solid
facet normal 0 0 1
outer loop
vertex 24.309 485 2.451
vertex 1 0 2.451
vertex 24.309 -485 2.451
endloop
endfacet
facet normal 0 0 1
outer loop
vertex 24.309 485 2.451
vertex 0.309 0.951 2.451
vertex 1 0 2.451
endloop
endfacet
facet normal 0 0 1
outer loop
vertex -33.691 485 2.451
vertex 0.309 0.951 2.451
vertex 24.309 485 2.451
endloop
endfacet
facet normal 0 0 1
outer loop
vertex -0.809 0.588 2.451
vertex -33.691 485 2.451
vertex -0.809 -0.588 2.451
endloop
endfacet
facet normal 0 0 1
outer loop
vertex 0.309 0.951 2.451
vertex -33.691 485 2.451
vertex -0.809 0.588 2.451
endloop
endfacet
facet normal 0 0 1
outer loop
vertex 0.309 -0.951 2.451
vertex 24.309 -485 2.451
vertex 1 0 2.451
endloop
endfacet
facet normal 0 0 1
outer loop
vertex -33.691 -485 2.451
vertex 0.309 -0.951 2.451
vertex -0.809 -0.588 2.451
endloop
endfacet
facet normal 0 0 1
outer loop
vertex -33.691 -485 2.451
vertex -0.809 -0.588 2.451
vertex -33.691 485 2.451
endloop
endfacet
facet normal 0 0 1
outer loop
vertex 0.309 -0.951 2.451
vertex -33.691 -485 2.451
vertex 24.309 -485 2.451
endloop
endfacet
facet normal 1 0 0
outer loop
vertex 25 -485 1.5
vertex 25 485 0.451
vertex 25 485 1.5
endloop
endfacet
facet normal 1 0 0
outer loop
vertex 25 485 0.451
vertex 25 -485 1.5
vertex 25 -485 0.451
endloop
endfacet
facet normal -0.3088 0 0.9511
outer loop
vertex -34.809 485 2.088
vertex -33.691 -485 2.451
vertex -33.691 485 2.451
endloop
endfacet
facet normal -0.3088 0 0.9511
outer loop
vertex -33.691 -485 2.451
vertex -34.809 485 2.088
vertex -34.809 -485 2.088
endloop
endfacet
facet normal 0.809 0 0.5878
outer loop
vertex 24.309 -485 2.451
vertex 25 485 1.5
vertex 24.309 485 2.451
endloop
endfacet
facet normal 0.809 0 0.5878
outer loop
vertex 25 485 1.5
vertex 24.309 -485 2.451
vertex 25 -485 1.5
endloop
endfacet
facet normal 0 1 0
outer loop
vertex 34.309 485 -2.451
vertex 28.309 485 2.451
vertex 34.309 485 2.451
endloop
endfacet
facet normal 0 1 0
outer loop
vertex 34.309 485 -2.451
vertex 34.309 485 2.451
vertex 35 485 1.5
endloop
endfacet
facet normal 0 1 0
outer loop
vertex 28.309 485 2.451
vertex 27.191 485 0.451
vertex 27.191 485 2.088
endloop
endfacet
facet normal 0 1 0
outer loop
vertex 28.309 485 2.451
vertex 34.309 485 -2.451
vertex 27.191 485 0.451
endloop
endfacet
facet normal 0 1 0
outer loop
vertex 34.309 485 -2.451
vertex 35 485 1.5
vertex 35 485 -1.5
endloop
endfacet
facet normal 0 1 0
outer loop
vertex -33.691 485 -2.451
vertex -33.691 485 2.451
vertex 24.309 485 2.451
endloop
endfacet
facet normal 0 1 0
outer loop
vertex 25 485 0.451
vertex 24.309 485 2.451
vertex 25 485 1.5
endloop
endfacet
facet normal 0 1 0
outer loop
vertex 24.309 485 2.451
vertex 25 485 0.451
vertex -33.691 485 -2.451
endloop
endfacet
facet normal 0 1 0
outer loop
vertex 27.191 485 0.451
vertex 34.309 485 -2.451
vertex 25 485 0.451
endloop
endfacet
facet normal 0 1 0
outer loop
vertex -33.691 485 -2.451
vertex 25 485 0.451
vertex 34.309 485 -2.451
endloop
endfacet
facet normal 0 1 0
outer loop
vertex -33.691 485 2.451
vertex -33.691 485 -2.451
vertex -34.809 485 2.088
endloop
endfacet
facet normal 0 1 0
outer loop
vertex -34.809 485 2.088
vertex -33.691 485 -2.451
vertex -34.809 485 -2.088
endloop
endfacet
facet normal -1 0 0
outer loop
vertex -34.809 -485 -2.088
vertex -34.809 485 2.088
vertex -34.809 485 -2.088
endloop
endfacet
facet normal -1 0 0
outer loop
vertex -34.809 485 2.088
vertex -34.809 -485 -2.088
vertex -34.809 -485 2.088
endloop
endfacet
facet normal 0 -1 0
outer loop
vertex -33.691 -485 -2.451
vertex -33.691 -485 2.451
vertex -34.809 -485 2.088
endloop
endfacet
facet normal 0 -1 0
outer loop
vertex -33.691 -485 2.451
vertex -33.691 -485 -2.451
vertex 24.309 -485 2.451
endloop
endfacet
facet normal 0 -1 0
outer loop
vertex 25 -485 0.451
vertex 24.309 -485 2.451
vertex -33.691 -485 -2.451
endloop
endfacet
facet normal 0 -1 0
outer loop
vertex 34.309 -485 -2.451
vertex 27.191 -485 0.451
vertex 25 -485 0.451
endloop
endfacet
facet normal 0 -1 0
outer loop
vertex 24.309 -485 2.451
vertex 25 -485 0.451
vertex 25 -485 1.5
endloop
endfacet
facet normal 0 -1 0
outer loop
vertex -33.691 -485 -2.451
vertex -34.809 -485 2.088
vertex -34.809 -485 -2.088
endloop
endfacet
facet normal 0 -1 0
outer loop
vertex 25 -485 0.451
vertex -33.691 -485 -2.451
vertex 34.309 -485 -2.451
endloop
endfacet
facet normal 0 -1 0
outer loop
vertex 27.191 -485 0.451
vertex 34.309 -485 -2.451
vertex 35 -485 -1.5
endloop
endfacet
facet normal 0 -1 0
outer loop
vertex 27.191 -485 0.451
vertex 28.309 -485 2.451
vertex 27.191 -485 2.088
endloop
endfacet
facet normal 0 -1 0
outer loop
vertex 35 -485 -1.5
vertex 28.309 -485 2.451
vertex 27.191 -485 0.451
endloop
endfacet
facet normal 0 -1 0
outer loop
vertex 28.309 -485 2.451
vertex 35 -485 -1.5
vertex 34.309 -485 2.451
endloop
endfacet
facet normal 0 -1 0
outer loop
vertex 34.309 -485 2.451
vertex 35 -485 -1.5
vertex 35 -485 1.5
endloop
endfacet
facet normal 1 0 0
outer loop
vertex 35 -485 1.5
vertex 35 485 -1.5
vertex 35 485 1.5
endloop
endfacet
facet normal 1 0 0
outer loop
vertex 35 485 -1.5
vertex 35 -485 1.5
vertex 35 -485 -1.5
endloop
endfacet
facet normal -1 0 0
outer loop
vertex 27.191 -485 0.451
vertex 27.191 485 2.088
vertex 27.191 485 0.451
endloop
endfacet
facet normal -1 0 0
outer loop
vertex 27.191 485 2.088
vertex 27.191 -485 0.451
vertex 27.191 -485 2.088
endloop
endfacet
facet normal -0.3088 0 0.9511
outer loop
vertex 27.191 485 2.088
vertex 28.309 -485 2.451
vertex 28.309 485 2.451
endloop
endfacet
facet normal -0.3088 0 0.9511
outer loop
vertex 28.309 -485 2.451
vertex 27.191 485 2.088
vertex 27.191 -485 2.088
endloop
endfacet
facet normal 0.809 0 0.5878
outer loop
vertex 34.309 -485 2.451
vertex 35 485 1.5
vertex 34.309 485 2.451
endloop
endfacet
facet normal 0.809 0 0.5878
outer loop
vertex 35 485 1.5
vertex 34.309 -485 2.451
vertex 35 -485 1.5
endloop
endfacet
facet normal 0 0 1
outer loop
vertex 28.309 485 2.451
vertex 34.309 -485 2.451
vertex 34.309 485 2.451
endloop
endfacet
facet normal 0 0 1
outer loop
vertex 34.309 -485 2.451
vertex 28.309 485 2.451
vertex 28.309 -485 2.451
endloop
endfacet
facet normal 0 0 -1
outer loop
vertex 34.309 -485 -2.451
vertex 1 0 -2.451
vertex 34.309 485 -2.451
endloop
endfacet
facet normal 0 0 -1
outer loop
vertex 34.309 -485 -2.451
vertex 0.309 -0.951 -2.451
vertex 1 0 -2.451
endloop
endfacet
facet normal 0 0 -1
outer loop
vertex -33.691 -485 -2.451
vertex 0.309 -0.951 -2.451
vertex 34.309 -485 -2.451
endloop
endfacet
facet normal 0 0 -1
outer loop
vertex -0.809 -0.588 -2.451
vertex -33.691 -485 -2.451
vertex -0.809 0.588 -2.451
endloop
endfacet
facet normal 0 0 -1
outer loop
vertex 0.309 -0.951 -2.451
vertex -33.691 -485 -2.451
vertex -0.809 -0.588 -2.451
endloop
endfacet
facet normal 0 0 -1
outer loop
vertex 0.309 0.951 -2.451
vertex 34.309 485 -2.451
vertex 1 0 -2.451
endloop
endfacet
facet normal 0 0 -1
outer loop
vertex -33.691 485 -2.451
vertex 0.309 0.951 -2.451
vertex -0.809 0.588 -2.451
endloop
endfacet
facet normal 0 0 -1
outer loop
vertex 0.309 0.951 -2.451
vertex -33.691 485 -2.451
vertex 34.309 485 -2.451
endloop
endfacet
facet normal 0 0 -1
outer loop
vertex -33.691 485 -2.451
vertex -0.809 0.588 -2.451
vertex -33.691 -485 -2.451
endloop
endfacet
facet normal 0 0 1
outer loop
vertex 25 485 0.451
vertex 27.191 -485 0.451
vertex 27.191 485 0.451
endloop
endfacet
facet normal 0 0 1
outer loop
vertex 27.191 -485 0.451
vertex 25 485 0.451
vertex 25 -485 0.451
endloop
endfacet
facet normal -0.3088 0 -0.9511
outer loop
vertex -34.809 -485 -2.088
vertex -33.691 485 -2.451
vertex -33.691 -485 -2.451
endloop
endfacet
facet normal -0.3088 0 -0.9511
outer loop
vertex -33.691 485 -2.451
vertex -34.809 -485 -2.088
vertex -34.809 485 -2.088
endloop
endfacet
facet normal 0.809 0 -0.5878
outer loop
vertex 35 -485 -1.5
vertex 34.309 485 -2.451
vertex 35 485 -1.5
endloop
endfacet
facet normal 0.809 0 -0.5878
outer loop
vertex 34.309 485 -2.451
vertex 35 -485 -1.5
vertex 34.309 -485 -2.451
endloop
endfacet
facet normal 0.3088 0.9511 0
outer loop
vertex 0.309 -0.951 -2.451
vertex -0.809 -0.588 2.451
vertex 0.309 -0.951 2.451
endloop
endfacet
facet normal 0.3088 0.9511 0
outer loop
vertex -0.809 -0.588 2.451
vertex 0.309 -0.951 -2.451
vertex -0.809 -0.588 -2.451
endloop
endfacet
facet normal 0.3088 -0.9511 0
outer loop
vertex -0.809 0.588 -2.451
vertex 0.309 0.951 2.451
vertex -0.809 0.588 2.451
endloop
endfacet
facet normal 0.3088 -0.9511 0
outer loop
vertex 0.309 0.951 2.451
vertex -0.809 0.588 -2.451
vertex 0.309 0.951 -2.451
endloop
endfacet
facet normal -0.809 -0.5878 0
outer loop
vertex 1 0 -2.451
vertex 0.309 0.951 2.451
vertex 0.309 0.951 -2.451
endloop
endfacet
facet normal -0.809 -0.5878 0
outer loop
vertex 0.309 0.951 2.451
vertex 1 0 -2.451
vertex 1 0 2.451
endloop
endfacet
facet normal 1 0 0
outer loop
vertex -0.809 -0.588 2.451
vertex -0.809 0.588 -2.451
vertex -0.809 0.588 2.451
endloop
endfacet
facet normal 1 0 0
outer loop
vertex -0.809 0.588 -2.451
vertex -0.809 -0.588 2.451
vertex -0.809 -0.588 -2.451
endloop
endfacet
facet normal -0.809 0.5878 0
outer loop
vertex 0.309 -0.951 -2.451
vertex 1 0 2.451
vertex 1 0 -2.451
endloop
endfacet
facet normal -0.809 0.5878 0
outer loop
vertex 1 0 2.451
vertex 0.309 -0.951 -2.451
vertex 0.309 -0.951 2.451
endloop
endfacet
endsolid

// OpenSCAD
difference (){
    minkowski()     
    {
        difference ()
        {
            cube([68, 969, 3], center = true);
            translate([26, 0, 0.5])
                cube([4, 2*969, 2], center = true);
        }
        rotate([90,0,0])
            cylinder(r=1, h=1, center = true);
    }
    cylinder(r = 1, h = 2*969, center = true);
}
